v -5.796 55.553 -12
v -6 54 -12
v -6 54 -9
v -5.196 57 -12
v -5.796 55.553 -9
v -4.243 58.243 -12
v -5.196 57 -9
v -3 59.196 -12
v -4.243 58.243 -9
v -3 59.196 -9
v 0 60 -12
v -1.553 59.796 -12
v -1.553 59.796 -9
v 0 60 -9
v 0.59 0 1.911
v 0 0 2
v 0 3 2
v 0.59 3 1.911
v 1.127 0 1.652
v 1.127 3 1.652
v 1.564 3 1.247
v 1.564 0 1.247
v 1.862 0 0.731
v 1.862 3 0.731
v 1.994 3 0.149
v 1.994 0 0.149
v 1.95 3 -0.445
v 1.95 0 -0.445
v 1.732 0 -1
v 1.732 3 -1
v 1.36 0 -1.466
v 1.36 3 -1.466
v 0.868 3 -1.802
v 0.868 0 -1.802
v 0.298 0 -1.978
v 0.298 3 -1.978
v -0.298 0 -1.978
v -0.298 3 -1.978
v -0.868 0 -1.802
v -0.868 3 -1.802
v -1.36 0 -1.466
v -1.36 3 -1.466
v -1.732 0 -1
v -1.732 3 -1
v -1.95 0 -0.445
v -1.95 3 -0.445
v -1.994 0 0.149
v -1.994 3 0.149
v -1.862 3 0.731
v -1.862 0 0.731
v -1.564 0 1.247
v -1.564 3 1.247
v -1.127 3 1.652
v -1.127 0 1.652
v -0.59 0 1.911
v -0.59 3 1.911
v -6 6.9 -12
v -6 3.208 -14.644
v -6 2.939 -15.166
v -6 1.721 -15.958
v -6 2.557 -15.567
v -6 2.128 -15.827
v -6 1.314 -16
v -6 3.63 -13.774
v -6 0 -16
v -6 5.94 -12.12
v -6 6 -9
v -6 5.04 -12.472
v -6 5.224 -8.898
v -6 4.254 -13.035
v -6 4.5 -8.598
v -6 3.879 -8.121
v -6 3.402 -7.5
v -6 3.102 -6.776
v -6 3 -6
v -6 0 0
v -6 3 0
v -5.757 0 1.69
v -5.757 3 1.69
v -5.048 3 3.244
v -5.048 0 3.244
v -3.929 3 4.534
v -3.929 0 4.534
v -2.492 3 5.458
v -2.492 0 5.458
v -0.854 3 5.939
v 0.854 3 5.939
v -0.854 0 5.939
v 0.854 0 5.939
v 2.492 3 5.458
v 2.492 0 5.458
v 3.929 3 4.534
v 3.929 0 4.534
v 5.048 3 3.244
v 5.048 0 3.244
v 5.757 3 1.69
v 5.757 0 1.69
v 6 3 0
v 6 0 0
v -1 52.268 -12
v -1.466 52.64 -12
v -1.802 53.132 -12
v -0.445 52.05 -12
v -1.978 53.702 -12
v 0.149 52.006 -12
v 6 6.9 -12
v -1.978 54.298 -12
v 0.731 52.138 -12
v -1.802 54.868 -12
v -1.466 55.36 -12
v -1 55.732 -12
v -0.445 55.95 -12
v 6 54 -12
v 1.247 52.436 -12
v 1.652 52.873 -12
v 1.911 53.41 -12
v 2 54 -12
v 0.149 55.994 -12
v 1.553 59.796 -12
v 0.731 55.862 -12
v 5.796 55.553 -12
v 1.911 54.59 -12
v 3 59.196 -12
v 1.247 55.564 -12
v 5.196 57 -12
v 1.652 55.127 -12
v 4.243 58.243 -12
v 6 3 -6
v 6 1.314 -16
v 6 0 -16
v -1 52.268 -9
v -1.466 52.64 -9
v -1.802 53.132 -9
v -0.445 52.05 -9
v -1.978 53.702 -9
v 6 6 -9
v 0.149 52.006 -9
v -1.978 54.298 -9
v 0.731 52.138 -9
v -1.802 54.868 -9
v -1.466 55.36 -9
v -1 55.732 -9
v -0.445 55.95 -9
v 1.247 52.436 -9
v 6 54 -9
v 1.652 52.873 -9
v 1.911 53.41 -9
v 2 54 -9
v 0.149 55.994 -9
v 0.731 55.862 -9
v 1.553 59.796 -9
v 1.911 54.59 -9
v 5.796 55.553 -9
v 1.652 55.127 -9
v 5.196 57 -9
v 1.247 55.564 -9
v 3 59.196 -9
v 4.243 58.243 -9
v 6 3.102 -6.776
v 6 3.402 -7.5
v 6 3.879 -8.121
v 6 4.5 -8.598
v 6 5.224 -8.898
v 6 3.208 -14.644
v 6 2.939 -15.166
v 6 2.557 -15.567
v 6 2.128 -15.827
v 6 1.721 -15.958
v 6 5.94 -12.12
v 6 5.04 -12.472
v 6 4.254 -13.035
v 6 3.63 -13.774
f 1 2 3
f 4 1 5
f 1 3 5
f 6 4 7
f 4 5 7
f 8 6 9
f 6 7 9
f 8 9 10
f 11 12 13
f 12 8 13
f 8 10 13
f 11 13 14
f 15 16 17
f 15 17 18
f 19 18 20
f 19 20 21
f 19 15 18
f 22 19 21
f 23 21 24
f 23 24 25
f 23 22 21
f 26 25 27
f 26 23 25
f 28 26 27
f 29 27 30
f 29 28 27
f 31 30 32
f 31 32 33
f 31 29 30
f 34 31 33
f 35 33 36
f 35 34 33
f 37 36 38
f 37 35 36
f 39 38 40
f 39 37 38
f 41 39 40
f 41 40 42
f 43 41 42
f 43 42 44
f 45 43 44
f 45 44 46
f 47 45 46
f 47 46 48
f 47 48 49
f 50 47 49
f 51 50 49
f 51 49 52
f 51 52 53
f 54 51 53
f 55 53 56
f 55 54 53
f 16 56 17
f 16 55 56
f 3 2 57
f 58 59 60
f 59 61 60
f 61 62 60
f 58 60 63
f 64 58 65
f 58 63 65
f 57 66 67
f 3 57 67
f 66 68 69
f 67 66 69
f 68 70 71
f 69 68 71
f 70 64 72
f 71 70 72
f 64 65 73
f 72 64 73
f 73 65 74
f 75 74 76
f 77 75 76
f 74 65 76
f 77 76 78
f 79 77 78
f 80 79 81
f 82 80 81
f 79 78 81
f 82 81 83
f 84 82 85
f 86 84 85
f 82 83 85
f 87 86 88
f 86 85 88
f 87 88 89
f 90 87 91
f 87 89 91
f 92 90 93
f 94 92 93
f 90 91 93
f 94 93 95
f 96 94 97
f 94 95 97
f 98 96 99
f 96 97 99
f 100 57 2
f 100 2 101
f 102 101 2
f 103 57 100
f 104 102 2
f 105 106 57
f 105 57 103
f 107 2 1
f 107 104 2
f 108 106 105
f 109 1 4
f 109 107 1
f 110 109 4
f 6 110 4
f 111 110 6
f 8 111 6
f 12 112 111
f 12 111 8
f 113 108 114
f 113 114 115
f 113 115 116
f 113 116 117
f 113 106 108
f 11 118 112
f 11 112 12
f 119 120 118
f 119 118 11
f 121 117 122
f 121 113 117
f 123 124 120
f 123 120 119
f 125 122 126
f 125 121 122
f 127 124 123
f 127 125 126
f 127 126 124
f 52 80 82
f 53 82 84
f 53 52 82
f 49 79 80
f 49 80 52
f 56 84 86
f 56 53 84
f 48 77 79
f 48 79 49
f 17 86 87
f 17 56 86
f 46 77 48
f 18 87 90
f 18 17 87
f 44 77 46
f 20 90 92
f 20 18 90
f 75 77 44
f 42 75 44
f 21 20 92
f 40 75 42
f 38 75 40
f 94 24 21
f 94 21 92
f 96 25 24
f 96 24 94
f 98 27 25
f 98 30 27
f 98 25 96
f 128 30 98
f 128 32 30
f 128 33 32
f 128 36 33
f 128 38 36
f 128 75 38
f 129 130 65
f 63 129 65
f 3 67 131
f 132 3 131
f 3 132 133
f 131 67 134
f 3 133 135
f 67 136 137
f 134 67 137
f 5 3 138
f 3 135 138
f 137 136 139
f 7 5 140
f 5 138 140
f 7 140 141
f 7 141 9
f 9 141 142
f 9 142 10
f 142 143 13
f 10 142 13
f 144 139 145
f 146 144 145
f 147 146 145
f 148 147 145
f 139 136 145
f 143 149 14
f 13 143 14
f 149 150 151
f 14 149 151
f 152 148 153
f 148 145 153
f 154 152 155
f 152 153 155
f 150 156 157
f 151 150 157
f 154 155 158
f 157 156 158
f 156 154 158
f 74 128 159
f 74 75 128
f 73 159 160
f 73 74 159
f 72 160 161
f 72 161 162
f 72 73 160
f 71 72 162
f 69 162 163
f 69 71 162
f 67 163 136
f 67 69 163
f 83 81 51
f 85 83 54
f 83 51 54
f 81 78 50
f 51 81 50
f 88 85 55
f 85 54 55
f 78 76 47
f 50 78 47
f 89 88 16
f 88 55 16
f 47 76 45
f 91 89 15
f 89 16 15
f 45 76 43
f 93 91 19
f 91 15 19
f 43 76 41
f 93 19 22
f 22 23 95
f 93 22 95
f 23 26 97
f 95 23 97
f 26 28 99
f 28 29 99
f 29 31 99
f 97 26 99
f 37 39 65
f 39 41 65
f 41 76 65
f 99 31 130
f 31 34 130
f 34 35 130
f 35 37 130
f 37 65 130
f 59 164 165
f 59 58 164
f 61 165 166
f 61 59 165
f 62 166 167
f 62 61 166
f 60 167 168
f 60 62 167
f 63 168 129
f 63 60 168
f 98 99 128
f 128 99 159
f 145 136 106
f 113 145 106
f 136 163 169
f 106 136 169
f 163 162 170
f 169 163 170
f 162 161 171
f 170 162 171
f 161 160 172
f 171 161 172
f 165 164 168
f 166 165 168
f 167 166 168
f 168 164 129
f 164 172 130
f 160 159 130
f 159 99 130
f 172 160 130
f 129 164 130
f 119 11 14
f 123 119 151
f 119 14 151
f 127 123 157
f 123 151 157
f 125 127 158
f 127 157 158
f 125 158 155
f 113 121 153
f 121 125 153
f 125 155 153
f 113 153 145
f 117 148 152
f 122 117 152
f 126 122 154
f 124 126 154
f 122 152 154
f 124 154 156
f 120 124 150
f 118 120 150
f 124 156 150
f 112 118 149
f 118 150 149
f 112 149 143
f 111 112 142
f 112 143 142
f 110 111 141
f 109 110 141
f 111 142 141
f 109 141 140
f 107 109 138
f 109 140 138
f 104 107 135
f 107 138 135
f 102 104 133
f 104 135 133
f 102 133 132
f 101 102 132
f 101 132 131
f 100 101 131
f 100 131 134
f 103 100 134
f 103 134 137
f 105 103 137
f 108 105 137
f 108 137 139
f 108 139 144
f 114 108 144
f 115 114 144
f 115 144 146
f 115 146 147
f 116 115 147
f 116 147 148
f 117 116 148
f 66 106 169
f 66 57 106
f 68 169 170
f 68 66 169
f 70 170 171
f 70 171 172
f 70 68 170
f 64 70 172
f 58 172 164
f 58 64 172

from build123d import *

# Parameters (mm, degrees)
SKETCH1_R           = 6
SKETCH1_R_2         = 2
BOSS_EXTRUDE1_DEPTH = 3
SKETCH2_W           = 3
SKETCH2_H           = 57
BOSS_EXTRUDE2_DEPTH = 12
CUT_EXTRUDE1_REACH  = 64.137
SKETCH3_R           = 2
FILLET1_R           = 3
FILLET2_R           = 3.9
FILLET3_R           = 2


with BuildPart() as part:
    # Sketch1 → Boss-Extrude1 (new body)
    # profile 1 of 2: a face of its own
    with BuildSketch(Plane(origin=(0, 0, 0), x_dir=(1, 0, 0), z_dir=(0, 1, 0))):
        with BuildLine():
            Line((-6, 16), (-6, 0))
            ThreePointArc((-6, 0), (0, 6), (6, 0))
            Line((6, 0), (6, 16))
            Line((6, 16), (-6, 16))
        make_face()
    # profile 2 of 2: a face of its own
    with BuildSketch(Plane(origin=(0, 0, 0), x_dir=(1, 0, 0), z_dir=(0, 1, 0))):
        Circle(SKETCH1_R)
        with Locations(Location((0, 0, 0), (0, 0, 270))):
            Circle(SKETCH1_R_2, mode=Mode.SUBTRACT)
    extrude(amount=BOSS_EXTRUDE1_DEPTH)

    # Sketch2 → Boss-Extrude2 (add)
    with BuildSketch(Plane(origin=(6, 0, 0), x_dir=(0, 0, -1), z_dir=(1, 0, 0))):
        with Locations((10.5, 31.5)):
            Rectangle(SKETCH2_W, SKETCH2_H)
    extrude(amount=-BOSS_EXTRUDE2_DEPTH)

    # Sketch3 → Cut-Extrude1 (cut, up to next)
    with BuildSketch(Plane.XY.offset(-9), mode=Mode.PRIVATE) as cut_extrude1_sk1:
        with BuildLine():
            Line((-6, 60), (-6, 54))
            ThreePointArc((-6, 54), (-4.242640687, 58.242640687), (0, 60))
            Line((0, 60), (-6, 60))
        make_face()
    cut_extrude1_tool1 = extrude(cut_extrude1_sk1.sketch, amount=-CUT_EXTRUDE1_REACH, mode=Mode.PRIVATE) & part.part
    # Sketch3 → Cut-Extrude1 (cut, up to next)
    with BuildSketch(Plane.XY.offset(-9), mode=Mode.PRIVATE) as cut_extrude1_sk2:
        with BuildLine():
            ThreePointArc((0, 60), (4.242640687, 58.242640687), (6, 54))
            Line((6, 54), (6, 60))
            Line((6, 60), (0, 60))
        make_face()
    cut_extrude1_tool2 = extrude(cut_extrude1_sk2.sketch, amount=-CUT_EXTRUDE1_REACH, mode=Mode.PRIVATE) & part.part
    # Sketch3 → Cut-Extrude1 (cut, up to next)
    with BuildSketch(Plane.XY.offset(-9), mode=Mode.PRIVATE) as cut_extrude1_sk3:
        with Locations((0, 54)):
            Circle(SKETCH3_R)
    cut_extrude1_tool3 = extrude(cut_extrude1_sk3.sketch, amount=-CUT_EXTRUDE1_REACH, mode=Mode.PRIVATE) & part.part
    add(cut_extrude1_tool1.solids().sort_by_distance((-4.659792, 58.659792, -9))[0], mode=Mode.SUBTRACT)
    add(cut_extrude1_tool2.solids().sort_by_distance((4.659792, 58.659792, -9))[0], mode=Mode.SUBTRACT)
    add(cut_extrude1_tool3.solids().sort_by_distance((0, 54, -9))[0], mode=Mode.SUBTRACT)

    # Fillet1
    fillet1_edges = [part.edges().sort_by_distance(p)[0] for p in [
        (0, 3, -9),
    ]]
    fillet(fillet1_edges, radius=FILLET1_R)

    # Fillet2
    fillet2_edges = [part.edges().sort_by_distance(p)[0] for p in [
        (0, 3, -12),
    ]]
    fillet(fillet2_edges, radius=FILLET2_R)

    # Fillet3
    fillet3_edges = [part.edges().sort_by_distance(p)[0] for p in [
        (0, 3, -16),
    ]]
    fillet(fillet3_edges, radius=FILLET3_R)


solid = part.part
